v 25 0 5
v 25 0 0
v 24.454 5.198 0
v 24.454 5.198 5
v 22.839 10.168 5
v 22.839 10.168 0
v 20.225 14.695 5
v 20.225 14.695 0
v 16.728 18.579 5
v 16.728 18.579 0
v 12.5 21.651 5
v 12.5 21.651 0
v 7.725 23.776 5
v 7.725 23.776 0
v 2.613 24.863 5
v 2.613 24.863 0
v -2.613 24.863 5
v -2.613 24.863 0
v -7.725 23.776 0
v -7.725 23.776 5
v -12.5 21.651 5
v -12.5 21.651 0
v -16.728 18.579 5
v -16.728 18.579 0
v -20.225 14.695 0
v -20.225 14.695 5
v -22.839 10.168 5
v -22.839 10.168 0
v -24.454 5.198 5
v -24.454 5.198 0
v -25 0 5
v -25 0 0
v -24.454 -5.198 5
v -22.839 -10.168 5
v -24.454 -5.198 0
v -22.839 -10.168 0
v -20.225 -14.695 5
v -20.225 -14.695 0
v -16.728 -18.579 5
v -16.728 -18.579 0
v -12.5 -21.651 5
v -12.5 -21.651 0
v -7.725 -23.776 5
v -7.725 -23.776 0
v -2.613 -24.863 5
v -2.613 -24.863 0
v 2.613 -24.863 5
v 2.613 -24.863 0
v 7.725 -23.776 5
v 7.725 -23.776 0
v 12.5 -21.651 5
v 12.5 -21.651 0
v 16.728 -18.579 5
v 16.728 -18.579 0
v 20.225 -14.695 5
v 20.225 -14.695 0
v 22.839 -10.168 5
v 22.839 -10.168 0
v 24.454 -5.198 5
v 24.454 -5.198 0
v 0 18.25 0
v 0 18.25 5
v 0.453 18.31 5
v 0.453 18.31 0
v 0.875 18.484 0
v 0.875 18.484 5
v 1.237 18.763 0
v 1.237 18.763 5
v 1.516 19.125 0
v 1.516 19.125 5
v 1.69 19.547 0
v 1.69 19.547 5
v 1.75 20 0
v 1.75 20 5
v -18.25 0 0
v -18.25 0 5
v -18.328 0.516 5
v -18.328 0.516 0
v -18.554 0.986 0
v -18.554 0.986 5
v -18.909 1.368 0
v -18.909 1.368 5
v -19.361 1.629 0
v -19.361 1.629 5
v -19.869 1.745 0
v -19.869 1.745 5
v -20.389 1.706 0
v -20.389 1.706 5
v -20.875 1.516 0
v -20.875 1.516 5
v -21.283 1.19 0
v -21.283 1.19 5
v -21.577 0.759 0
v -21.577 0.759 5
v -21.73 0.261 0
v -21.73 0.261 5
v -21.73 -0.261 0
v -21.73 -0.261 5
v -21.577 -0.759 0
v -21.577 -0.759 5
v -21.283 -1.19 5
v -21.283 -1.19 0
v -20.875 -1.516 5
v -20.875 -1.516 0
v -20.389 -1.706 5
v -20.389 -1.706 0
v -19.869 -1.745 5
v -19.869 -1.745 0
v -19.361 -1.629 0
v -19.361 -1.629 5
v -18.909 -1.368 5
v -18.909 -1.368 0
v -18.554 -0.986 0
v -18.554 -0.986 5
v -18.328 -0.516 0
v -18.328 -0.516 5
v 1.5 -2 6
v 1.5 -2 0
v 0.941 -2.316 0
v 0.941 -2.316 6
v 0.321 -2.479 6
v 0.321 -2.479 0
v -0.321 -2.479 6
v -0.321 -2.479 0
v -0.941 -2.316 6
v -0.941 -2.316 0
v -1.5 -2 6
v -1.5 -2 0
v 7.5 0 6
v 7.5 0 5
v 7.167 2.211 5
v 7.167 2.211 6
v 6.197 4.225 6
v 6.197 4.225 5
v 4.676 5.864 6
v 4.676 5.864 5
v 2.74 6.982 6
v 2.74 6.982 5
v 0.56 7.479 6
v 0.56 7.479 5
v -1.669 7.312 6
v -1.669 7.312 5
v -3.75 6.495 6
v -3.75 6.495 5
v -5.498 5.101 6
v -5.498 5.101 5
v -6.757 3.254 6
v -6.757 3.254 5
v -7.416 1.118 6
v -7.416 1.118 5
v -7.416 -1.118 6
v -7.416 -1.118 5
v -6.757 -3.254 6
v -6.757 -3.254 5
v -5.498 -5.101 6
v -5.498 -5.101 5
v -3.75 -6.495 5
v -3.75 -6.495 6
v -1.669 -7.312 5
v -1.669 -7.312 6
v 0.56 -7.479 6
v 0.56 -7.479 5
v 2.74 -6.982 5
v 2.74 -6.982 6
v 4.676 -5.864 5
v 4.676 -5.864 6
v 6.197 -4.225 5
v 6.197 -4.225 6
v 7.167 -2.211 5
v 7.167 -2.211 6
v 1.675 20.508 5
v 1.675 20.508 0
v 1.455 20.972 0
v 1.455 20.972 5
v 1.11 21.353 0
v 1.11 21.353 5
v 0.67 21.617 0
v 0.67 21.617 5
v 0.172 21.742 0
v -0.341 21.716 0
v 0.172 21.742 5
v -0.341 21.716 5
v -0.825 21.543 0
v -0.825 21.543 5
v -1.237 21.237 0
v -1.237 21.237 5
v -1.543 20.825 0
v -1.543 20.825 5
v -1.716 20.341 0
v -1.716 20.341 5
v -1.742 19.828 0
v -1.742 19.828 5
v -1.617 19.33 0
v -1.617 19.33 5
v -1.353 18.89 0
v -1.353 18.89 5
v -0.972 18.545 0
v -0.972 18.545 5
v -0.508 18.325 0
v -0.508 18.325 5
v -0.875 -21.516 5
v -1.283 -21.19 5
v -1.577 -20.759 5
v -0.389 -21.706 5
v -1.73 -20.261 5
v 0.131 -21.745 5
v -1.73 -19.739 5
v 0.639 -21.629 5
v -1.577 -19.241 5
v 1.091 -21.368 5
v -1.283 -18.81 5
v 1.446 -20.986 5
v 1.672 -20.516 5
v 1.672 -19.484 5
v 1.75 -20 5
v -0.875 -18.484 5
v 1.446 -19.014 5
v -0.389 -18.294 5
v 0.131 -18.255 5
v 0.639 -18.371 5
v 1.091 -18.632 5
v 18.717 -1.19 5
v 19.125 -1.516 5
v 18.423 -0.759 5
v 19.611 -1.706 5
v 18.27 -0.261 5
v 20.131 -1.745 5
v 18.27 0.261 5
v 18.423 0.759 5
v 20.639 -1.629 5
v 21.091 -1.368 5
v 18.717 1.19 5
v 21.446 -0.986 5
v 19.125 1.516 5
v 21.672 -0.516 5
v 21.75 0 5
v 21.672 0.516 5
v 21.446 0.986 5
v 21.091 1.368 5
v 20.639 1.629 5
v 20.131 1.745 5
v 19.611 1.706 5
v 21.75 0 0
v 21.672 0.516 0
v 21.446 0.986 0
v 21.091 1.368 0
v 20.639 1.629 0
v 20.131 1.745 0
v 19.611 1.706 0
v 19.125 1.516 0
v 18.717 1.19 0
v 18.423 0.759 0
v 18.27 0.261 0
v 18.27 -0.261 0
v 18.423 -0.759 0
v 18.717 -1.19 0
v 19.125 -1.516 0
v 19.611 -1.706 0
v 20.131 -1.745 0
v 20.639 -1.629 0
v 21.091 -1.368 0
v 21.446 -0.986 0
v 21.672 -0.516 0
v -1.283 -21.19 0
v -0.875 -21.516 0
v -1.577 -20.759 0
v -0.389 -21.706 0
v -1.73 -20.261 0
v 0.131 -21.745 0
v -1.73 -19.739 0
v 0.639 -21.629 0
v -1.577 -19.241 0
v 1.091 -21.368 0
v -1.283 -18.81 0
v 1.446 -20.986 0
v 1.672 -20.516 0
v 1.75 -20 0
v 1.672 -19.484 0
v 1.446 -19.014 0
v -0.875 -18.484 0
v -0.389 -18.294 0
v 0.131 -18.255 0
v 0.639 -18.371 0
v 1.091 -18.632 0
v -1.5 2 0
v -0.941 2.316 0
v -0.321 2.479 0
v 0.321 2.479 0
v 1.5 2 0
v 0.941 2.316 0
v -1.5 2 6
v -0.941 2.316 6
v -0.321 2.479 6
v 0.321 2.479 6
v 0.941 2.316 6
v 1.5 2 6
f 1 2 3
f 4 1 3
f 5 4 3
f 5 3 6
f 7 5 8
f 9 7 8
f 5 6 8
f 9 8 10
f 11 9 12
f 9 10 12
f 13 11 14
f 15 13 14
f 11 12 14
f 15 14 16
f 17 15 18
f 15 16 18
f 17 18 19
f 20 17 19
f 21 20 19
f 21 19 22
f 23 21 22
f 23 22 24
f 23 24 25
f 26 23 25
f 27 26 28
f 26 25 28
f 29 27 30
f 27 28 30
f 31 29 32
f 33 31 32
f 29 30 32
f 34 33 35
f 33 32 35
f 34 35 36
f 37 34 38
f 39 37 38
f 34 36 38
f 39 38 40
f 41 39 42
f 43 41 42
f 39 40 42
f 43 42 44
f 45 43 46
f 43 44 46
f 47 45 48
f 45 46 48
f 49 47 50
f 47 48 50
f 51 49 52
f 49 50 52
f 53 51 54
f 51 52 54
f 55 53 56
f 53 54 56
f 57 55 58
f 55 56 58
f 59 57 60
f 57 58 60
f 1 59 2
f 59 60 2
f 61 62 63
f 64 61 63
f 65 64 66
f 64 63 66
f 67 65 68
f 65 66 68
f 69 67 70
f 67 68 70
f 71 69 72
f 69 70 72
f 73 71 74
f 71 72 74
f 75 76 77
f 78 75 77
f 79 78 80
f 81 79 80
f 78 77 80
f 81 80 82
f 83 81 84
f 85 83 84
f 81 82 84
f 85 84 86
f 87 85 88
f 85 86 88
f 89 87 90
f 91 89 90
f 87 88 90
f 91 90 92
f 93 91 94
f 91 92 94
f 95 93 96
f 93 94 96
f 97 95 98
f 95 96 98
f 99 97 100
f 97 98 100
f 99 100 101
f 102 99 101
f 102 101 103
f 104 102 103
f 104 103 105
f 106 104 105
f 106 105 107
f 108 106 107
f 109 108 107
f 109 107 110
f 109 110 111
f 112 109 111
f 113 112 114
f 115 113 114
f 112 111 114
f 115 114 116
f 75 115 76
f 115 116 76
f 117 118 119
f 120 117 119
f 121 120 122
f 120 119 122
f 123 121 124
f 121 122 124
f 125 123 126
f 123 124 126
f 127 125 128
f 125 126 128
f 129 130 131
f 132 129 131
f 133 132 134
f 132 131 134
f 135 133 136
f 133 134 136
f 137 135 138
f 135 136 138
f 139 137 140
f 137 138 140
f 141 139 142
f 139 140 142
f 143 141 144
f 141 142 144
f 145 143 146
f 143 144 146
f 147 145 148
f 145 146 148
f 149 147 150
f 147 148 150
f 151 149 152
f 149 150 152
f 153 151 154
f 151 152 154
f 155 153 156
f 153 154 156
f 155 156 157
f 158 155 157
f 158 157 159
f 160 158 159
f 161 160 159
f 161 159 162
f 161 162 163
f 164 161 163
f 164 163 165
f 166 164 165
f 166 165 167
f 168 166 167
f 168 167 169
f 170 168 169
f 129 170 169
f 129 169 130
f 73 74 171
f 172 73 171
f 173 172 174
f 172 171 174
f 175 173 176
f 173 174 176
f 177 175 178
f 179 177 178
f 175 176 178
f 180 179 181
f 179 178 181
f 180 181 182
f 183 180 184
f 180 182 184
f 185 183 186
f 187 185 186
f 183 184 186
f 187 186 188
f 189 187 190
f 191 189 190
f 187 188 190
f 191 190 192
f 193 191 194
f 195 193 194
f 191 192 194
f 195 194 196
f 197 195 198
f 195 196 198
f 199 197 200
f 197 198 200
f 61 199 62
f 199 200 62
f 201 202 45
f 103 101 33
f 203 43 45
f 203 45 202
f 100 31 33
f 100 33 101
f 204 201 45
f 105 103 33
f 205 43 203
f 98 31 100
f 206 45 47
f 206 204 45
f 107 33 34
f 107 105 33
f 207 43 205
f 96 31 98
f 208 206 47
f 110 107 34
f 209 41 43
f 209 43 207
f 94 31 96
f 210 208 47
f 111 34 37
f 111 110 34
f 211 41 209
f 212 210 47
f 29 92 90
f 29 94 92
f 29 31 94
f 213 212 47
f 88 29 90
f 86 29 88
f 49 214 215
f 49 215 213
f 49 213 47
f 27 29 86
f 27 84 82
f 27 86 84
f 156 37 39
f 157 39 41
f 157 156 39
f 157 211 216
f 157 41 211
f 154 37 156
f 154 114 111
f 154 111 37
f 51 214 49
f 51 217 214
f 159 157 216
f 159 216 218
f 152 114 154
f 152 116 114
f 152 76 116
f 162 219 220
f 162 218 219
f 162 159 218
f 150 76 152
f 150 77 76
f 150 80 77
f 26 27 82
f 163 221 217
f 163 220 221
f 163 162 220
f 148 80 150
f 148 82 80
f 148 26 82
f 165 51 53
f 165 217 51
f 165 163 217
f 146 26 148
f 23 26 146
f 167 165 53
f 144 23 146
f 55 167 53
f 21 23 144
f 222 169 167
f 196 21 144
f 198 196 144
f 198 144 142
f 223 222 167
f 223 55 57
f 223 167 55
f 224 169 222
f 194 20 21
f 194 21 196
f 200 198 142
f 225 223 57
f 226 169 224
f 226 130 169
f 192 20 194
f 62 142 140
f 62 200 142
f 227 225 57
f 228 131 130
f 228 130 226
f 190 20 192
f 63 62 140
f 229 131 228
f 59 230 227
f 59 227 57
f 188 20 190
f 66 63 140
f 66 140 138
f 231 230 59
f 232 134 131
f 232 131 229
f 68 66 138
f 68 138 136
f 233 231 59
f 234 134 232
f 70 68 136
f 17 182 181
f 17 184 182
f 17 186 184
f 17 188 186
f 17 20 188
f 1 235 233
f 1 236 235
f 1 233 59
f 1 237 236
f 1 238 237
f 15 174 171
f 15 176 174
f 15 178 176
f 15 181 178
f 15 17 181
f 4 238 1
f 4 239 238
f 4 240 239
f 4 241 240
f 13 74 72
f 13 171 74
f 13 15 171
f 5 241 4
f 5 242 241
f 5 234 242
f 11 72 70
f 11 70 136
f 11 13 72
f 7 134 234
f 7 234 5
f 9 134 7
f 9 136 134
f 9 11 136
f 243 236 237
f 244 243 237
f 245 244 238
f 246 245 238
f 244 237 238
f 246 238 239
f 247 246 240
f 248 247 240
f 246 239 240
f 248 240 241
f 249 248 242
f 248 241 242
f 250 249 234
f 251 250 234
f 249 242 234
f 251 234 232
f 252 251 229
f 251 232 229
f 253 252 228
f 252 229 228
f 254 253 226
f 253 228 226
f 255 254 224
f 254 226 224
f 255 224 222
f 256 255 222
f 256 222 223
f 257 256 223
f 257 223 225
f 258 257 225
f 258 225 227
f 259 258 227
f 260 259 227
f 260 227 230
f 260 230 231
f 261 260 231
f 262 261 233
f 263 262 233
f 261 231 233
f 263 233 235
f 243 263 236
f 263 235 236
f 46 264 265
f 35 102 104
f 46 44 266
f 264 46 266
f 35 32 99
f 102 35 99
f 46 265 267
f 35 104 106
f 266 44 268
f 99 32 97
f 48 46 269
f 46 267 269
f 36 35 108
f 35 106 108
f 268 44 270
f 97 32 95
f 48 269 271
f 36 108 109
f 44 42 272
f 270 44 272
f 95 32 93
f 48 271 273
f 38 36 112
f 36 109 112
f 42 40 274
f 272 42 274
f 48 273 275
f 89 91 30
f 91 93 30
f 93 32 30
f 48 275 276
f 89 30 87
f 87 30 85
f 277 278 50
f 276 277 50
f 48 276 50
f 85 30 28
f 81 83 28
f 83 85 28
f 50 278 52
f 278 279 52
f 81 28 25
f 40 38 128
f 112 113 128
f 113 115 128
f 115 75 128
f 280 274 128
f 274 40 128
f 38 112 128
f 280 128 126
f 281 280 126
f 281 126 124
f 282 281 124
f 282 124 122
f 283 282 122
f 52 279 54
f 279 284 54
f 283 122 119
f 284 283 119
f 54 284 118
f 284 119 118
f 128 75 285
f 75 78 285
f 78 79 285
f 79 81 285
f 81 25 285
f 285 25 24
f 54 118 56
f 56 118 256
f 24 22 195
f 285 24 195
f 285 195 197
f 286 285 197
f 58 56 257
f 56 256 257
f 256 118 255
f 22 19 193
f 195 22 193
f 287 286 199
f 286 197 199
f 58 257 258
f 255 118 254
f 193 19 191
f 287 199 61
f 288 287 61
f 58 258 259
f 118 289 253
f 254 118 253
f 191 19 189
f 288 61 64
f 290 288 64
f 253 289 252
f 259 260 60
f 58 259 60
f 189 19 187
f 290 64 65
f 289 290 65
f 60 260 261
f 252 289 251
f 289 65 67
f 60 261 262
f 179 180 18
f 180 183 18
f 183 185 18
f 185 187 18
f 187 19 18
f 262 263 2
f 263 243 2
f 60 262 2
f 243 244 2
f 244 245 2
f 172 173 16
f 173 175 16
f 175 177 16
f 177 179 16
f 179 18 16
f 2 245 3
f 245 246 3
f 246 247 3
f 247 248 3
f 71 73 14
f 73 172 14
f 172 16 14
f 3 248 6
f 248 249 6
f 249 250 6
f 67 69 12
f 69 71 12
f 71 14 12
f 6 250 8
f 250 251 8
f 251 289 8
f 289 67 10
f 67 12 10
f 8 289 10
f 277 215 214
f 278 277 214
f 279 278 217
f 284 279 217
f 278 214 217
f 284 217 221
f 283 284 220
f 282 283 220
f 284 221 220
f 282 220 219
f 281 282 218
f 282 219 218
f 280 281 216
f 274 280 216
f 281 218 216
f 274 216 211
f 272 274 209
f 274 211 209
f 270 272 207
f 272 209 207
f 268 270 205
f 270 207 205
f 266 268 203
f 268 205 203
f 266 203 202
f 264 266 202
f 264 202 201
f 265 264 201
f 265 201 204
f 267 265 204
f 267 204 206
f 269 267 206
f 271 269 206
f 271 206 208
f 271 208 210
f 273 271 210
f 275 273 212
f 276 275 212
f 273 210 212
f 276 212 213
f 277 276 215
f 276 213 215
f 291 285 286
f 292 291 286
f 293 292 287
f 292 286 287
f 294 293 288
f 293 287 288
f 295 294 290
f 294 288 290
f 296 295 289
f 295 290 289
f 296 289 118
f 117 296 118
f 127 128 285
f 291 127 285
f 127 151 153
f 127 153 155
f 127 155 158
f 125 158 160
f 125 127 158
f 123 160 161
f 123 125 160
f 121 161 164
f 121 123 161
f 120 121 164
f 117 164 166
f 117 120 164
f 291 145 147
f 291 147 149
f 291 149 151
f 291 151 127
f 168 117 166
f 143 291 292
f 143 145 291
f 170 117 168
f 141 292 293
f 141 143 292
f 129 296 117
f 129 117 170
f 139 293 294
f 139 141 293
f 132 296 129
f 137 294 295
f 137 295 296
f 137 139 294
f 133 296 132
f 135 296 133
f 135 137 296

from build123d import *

# Parameters (mm, degrees)
F0_R     = 7.5
F0_R_2   = 25
F1_DEPTH = 5
F2_DEPTH = 6
F3_R     = 1.75
F4_DEPTH = 5


with BuildPart() as f1:
    # F0 (on Top) → F1 (new body)
    with BuildSketch(Plane.XY):
        Circle(F0_R)
        with BuildLine():
            ThreePointArc((1.5, -2), (0, -2.5), (-1.5, -2))
            Line((-1.5, -2), (-1.5, 2))
            ThreePointArc((-1.5, 2), (0, 2.5), (1.5, 2))
            Line((1.5, 2), (1.5, -2))
        make_face(mode=Mode.SUBTRACT)
        Circle(F0_R_2)
        Circle(F0_R, mode=Mode.SUBTRACT)
    extrude(amount=F1_DEPTH)

    # F0 (on Top) → F2 (join)
    with BuildSketch(Plane.XY):
        Circle(F0_R)
        with BuildLine():
            ThreePointArc((1.5, -2), (0, -2.5), (-1.5, -2))
            Line((-1.5, -2), (-1.5, 2))
            ThreePointArc((-1.5, 2), (0, 2.5), (1.5, 2))
            Line((1.5, 2), (1.5, -2))
        make_face(mode=Mode.SUBTRACT)
    extrude(amount=F2_DEPTH)

    # F3 (on face) → F4 (cut)
    with BuildSketch(Plane.XY.offset(5)):
        with BuildLine():
            ThreePointArc((0, 18.25), (1.237437, 18.762563), (1.75, 20))
            ThreePointArc((1.75, 20), (-1.237437, 21.237437), (0, 18.25))
        make_face()
        with Locations((20, 0)):
            Circle(F3_R)
        with Locations((0, -20)):
            Circle(F3_R)
        with Locations((-20, 0)):
            Circle(F3_R)
    extrude(amount=-F4_DEPTH, mode=Mode.SUBTRACT)


solid = f1.part
